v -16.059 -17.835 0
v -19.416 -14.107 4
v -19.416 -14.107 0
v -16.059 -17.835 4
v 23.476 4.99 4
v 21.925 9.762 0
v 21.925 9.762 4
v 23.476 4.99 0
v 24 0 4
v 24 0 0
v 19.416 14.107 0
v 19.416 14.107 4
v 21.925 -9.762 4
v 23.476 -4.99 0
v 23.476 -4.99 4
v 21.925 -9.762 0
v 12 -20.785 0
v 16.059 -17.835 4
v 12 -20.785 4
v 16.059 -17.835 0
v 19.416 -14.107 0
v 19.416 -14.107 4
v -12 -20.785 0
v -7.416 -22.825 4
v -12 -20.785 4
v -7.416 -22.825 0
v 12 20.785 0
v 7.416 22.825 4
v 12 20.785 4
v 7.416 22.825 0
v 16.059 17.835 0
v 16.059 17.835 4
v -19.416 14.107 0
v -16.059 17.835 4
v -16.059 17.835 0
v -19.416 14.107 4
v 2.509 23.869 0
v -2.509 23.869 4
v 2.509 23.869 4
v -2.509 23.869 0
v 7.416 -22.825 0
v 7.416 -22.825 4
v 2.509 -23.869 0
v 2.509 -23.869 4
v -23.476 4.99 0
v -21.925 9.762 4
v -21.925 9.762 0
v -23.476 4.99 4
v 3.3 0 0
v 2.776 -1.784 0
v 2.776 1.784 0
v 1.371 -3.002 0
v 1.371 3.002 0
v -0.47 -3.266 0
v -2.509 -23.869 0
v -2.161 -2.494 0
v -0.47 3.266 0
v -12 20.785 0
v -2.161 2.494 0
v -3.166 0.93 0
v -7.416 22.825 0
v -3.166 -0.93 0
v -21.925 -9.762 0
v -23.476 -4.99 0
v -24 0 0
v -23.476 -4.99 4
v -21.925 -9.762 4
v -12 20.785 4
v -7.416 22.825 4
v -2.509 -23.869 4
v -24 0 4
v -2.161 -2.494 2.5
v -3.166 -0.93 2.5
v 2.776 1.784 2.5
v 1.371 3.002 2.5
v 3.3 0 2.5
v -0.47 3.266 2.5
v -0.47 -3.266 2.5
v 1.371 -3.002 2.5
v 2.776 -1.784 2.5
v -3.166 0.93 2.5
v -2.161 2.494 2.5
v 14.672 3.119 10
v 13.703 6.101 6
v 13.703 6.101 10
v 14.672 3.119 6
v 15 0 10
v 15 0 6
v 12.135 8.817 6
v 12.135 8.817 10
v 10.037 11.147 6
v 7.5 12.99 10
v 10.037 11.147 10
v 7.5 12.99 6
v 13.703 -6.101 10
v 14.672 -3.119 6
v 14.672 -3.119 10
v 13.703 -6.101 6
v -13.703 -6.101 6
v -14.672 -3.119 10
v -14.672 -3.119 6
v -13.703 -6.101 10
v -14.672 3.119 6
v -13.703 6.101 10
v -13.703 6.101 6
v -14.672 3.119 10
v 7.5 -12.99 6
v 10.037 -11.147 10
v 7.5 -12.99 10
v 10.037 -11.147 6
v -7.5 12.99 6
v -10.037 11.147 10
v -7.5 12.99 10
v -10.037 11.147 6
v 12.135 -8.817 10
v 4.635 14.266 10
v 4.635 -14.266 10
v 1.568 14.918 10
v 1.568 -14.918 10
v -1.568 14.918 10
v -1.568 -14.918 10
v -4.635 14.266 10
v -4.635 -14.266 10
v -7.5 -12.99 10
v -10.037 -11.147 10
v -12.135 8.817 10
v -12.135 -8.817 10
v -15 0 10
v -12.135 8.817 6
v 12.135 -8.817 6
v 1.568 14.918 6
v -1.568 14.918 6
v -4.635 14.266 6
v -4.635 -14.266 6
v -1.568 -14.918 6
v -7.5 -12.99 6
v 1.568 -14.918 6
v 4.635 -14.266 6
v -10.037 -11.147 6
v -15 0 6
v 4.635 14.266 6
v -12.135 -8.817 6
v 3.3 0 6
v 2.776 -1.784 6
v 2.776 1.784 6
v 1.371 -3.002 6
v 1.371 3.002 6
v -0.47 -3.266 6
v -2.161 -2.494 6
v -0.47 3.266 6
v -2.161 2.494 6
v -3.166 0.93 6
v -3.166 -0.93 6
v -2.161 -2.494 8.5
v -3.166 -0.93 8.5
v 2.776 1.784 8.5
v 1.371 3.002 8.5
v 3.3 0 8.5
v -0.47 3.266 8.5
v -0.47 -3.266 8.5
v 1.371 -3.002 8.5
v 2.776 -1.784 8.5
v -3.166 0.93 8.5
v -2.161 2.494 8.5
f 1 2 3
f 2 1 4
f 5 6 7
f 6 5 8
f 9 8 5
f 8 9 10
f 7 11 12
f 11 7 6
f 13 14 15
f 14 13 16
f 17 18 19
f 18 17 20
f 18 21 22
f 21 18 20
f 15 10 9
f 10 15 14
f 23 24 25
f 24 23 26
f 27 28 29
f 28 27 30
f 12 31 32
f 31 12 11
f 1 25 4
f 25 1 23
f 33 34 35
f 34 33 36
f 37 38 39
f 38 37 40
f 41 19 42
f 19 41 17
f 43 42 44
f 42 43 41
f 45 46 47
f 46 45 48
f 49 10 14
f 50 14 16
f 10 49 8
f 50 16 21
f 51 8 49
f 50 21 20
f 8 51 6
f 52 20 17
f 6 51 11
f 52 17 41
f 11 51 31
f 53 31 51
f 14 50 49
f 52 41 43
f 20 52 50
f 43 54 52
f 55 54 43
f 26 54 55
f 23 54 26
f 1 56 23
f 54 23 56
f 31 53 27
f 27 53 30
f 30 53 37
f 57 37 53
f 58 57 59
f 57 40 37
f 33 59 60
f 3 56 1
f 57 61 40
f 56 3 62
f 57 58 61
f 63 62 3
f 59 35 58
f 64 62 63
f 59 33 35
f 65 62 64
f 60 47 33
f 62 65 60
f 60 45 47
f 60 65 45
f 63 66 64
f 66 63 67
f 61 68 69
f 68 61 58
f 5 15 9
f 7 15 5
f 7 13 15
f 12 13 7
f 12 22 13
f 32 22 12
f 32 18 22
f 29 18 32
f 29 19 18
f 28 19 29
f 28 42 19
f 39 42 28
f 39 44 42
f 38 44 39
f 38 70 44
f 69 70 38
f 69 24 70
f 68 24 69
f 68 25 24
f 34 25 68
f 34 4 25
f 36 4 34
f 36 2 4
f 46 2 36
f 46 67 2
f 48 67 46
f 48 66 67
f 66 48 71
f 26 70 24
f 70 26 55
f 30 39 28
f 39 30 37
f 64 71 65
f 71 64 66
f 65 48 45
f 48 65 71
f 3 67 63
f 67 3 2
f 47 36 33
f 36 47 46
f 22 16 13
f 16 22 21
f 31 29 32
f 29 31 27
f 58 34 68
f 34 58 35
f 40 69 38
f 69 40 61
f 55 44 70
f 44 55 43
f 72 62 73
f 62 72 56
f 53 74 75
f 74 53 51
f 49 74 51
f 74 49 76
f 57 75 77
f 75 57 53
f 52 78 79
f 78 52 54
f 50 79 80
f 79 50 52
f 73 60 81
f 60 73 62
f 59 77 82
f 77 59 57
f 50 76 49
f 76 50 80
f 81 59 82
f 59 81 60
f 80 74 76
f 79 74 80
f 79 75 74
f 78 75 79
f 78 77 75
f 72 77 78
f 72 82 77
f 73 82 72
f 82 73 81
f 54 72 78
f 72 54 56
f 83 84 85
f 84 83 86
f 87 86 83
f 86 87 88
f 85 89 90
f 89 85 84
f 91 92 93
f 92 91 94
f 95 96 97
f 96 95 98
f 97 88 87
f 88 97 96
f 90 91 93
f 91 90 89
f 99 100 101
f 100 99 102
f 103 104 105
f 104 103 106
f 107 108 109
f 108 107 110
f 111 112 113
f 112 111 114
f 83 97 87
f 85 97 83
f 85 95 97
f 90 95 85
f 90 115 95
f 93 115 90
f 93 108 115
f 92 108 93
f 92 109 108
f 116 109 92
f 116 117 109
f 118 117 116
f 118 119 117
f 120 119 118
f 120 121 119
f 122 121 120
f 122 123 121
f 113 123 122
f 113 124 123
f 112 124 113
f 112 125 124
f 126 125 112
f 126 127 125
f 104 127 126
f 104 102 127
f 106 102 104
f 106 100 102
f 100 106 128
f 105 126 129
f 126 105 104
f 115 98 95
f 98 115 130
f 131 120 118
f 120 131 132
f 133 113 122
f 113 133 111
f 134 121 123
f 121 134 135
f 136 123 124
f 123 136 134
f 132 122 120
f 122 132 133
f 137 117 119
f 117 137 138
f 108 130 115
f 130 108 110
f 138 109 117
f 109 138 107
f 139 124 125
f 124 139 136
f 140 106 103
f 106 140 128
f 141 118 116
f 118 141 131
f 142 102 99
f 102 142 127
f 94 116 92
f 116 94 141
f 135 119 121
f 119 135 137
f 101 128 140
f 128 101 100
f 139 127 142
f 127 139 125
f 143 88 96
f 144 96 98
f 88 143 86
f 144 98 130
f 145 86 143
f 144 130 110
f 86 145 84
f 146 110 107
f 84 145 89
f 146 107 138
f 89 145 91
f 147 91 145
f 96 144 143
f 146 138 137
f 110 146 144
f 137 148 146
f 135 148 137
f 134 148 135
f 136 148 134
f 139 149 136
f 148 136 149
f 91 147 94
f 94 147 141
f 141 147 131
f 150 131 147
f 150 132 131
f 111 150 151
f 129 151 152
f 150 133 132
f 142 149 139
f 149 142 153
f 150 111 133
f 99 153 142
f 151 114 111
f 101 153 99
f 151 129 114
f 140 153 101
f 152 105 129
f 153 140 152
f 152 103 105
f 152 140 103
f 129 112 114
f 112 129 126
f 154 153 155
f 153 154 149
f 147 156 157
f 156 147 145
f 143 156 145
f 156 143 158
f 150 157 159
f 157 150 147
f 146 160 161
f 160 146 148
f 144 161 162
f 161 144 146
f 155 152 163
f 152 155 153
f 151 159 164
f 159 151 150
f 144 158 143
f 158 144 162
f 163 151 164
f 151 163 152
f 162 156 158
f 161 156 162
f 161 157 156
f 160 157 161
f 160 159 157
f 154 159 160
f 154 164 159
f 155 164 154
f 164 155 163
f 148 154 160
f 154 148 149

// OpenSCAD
// 独立摆锤台架 —— Part 3b: 端部砝码托 weight_tray.scad
// M6 中心螺柱穿砝码片(标准 20mm 孔 50/100/200g 铸铁片 或 自制的钢片),
// 托盘底 + 顶盖夹紧; 砝码总质量 = 实际称重(计入 m_tip)。

tray_d  = 48;      // 托盘直径
tray_t  = 4;       // 托盘厚
m6_d    = 6.6;     // M6 通孔
disk_h  = 10;      // 砝码片高度典型值(只画示意)
cap_d   = 30;      // 顶盖直径
cap_t   = 4;

module tray() {
    difference() {
        cylinder(d = tray_d, h = tray_t);
        cylinder(d = m6_d, h = tray_t + 1, center = true);
    }
}
module cap() {
    difference() {
        cylinder(d = cap_d, h = cap_t);
        cylinder(d = m6_d, h = cap_t + 1, center = true);
    }
}
tray();                              // 放到杆末端
translate([0, 0, disk_h - tray_t]) cap();
